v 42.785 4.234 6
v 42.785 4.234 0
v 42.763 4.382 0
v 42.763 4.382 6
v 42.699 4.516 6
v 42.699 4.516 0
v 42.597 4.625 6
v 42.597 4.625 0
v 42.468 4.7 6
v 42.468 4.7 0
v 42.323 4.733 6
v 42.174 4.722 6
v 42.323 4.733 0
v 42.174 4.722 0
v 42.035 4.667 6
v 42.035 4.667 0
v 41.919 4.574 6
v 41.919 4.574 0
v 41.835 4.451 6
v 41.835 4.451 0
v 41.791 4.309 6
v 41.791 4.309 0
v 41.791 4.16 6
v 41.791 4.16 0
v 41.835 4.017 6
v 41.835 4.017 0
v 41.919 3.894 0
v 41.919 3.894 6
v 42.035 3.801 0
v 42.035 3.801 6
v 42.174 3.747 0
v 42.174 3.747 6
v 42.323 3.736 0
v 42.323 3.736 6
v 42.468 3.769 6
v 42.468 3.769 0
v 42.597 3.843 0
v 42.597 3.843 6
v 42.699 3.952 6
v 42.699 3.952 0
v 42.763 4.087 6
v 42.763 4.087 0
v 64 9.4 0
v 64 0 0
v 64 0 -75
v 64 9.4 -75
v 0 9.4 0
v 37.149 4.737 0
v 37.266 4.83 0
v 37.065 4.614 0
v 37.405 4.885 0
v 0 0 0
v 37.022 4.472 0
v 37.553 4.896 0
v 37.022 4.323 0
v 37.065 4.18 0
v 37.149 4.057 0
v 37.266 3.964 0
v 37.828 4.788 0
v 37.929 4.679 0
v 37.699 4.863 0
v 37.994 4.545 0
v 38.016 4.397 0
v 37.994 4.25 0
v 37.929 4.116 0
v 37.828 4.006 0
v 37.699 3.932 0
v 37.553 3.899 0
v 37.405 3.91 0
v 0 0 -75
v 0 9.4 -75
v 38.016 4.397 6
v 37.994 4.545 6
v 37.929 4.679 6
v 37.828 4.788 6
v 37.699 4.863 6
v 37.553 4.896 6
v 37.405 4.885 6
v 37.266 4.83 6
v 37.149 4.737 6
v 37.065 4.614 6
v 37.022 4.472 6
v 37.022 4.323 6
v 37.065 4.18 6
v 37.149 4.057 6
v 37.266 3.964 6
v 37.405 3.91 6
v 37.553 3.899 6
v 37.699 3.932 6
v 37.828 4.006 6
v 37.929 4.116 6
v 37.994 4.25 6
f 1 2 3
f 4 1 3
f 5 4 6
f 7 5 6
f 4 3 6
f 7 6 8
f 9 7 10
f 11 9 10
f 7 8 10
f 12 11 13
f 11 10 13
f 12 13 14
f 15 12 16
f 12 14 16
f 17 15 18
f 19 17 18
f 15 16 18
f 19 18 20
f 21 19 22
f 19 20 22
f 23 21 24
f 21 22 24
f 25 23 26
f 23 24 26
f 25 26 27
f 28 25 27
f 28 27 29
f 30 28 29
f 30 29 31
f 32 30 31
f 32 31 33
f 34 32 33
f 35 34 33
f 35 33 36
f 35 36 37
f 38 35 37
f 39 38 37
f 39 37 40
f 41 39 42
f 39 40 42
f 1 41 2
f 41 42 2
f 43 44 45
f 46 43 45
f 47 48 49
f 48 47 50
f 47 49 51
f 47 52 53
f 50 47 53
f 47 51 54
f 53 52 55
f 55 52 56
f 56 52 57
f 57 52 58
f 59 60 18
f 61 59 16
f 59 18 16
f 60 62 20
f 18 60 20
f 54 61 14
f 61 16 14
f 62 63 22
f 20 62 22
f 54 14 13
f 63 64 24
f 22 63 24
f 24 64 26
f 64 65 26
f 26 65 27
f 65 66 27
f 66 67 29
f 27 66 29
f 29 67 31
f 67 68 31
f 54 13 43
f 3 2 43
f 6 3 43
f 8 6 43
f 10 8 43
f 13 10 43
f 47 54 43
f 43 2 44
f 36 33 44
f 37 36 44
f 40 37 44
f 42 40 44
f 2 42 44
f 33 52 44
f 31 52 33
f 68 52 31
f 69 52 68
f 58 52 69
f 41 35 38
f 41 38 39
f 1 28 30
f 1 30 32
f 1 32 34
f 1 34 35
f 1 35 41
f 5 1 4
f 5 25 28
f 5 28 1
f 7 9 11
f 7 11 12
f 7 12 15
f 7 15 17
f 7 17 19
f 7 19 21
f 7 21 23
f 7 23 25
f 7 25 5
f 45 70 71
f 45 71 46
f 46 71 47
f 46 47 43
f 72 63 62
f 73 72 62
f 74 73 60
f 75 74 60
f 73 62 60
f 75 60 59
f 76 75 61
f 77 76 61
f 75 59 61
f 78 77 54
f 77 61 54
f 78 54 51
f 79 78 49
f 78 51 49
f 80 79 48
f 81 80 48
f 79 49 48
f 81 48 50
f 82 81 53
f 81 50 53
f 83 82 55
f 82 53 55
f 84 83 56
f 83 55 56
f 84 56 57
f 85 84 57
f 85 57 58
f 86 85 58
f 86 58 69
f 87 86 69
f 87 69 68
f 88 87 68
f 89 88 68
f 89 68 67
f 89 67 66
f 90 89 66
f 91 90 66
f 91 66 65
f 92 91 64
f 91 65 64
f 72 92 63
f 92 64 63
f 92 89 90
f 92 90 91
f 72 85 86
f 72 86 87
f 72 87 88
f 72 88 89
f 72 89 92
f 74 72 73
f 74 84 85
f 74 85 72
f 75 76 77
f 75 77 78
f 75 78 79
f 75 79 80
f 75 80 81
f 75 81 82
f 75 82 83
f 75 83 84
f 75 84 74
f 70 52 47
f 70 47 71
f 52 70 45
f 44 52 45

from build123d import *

# Parameters (mm, degrees)
SKETCH1_W           = 64
SKETCH1_H           = 75
BOSS_EXTRUDE1_DEPTH = 9.4
SKETCH3_R           = 0.5
BOSS_EXTRUDE2_DEPTH = 6


with BuildPart() as part:
    # Sketch1 → Boss-Extrude1 (new body)
    with BuildSketch(Plane(origin=(0, 0, 0), x_dir=(1, 0, 0), z_dir=(0, 1, 0))):
        with Locations((32, 37.5)):
            Rectangle(SKETCH1_W, SKETCH1_H)
    extrude(amount=BOSS_EXTRUDE1_DEPTH)

    # Sketch3 → Boss-Extrude2 (add)
    with BuildSketch(Plane(origin=(13.525948084, 0, 0), x_dir=(1, 0, 0), z_dir=(0, 0, 1))):
        with Locations((23.990000312, 4.397240371)):
            Circle(SKETCH3_R)
        with Locations((28.759444519, 4.234135385)):
            Circle(SKETCH3_R)
    extrude(amount=BOSS_EXTRUDE2_DEPTH)


solid = part.part
